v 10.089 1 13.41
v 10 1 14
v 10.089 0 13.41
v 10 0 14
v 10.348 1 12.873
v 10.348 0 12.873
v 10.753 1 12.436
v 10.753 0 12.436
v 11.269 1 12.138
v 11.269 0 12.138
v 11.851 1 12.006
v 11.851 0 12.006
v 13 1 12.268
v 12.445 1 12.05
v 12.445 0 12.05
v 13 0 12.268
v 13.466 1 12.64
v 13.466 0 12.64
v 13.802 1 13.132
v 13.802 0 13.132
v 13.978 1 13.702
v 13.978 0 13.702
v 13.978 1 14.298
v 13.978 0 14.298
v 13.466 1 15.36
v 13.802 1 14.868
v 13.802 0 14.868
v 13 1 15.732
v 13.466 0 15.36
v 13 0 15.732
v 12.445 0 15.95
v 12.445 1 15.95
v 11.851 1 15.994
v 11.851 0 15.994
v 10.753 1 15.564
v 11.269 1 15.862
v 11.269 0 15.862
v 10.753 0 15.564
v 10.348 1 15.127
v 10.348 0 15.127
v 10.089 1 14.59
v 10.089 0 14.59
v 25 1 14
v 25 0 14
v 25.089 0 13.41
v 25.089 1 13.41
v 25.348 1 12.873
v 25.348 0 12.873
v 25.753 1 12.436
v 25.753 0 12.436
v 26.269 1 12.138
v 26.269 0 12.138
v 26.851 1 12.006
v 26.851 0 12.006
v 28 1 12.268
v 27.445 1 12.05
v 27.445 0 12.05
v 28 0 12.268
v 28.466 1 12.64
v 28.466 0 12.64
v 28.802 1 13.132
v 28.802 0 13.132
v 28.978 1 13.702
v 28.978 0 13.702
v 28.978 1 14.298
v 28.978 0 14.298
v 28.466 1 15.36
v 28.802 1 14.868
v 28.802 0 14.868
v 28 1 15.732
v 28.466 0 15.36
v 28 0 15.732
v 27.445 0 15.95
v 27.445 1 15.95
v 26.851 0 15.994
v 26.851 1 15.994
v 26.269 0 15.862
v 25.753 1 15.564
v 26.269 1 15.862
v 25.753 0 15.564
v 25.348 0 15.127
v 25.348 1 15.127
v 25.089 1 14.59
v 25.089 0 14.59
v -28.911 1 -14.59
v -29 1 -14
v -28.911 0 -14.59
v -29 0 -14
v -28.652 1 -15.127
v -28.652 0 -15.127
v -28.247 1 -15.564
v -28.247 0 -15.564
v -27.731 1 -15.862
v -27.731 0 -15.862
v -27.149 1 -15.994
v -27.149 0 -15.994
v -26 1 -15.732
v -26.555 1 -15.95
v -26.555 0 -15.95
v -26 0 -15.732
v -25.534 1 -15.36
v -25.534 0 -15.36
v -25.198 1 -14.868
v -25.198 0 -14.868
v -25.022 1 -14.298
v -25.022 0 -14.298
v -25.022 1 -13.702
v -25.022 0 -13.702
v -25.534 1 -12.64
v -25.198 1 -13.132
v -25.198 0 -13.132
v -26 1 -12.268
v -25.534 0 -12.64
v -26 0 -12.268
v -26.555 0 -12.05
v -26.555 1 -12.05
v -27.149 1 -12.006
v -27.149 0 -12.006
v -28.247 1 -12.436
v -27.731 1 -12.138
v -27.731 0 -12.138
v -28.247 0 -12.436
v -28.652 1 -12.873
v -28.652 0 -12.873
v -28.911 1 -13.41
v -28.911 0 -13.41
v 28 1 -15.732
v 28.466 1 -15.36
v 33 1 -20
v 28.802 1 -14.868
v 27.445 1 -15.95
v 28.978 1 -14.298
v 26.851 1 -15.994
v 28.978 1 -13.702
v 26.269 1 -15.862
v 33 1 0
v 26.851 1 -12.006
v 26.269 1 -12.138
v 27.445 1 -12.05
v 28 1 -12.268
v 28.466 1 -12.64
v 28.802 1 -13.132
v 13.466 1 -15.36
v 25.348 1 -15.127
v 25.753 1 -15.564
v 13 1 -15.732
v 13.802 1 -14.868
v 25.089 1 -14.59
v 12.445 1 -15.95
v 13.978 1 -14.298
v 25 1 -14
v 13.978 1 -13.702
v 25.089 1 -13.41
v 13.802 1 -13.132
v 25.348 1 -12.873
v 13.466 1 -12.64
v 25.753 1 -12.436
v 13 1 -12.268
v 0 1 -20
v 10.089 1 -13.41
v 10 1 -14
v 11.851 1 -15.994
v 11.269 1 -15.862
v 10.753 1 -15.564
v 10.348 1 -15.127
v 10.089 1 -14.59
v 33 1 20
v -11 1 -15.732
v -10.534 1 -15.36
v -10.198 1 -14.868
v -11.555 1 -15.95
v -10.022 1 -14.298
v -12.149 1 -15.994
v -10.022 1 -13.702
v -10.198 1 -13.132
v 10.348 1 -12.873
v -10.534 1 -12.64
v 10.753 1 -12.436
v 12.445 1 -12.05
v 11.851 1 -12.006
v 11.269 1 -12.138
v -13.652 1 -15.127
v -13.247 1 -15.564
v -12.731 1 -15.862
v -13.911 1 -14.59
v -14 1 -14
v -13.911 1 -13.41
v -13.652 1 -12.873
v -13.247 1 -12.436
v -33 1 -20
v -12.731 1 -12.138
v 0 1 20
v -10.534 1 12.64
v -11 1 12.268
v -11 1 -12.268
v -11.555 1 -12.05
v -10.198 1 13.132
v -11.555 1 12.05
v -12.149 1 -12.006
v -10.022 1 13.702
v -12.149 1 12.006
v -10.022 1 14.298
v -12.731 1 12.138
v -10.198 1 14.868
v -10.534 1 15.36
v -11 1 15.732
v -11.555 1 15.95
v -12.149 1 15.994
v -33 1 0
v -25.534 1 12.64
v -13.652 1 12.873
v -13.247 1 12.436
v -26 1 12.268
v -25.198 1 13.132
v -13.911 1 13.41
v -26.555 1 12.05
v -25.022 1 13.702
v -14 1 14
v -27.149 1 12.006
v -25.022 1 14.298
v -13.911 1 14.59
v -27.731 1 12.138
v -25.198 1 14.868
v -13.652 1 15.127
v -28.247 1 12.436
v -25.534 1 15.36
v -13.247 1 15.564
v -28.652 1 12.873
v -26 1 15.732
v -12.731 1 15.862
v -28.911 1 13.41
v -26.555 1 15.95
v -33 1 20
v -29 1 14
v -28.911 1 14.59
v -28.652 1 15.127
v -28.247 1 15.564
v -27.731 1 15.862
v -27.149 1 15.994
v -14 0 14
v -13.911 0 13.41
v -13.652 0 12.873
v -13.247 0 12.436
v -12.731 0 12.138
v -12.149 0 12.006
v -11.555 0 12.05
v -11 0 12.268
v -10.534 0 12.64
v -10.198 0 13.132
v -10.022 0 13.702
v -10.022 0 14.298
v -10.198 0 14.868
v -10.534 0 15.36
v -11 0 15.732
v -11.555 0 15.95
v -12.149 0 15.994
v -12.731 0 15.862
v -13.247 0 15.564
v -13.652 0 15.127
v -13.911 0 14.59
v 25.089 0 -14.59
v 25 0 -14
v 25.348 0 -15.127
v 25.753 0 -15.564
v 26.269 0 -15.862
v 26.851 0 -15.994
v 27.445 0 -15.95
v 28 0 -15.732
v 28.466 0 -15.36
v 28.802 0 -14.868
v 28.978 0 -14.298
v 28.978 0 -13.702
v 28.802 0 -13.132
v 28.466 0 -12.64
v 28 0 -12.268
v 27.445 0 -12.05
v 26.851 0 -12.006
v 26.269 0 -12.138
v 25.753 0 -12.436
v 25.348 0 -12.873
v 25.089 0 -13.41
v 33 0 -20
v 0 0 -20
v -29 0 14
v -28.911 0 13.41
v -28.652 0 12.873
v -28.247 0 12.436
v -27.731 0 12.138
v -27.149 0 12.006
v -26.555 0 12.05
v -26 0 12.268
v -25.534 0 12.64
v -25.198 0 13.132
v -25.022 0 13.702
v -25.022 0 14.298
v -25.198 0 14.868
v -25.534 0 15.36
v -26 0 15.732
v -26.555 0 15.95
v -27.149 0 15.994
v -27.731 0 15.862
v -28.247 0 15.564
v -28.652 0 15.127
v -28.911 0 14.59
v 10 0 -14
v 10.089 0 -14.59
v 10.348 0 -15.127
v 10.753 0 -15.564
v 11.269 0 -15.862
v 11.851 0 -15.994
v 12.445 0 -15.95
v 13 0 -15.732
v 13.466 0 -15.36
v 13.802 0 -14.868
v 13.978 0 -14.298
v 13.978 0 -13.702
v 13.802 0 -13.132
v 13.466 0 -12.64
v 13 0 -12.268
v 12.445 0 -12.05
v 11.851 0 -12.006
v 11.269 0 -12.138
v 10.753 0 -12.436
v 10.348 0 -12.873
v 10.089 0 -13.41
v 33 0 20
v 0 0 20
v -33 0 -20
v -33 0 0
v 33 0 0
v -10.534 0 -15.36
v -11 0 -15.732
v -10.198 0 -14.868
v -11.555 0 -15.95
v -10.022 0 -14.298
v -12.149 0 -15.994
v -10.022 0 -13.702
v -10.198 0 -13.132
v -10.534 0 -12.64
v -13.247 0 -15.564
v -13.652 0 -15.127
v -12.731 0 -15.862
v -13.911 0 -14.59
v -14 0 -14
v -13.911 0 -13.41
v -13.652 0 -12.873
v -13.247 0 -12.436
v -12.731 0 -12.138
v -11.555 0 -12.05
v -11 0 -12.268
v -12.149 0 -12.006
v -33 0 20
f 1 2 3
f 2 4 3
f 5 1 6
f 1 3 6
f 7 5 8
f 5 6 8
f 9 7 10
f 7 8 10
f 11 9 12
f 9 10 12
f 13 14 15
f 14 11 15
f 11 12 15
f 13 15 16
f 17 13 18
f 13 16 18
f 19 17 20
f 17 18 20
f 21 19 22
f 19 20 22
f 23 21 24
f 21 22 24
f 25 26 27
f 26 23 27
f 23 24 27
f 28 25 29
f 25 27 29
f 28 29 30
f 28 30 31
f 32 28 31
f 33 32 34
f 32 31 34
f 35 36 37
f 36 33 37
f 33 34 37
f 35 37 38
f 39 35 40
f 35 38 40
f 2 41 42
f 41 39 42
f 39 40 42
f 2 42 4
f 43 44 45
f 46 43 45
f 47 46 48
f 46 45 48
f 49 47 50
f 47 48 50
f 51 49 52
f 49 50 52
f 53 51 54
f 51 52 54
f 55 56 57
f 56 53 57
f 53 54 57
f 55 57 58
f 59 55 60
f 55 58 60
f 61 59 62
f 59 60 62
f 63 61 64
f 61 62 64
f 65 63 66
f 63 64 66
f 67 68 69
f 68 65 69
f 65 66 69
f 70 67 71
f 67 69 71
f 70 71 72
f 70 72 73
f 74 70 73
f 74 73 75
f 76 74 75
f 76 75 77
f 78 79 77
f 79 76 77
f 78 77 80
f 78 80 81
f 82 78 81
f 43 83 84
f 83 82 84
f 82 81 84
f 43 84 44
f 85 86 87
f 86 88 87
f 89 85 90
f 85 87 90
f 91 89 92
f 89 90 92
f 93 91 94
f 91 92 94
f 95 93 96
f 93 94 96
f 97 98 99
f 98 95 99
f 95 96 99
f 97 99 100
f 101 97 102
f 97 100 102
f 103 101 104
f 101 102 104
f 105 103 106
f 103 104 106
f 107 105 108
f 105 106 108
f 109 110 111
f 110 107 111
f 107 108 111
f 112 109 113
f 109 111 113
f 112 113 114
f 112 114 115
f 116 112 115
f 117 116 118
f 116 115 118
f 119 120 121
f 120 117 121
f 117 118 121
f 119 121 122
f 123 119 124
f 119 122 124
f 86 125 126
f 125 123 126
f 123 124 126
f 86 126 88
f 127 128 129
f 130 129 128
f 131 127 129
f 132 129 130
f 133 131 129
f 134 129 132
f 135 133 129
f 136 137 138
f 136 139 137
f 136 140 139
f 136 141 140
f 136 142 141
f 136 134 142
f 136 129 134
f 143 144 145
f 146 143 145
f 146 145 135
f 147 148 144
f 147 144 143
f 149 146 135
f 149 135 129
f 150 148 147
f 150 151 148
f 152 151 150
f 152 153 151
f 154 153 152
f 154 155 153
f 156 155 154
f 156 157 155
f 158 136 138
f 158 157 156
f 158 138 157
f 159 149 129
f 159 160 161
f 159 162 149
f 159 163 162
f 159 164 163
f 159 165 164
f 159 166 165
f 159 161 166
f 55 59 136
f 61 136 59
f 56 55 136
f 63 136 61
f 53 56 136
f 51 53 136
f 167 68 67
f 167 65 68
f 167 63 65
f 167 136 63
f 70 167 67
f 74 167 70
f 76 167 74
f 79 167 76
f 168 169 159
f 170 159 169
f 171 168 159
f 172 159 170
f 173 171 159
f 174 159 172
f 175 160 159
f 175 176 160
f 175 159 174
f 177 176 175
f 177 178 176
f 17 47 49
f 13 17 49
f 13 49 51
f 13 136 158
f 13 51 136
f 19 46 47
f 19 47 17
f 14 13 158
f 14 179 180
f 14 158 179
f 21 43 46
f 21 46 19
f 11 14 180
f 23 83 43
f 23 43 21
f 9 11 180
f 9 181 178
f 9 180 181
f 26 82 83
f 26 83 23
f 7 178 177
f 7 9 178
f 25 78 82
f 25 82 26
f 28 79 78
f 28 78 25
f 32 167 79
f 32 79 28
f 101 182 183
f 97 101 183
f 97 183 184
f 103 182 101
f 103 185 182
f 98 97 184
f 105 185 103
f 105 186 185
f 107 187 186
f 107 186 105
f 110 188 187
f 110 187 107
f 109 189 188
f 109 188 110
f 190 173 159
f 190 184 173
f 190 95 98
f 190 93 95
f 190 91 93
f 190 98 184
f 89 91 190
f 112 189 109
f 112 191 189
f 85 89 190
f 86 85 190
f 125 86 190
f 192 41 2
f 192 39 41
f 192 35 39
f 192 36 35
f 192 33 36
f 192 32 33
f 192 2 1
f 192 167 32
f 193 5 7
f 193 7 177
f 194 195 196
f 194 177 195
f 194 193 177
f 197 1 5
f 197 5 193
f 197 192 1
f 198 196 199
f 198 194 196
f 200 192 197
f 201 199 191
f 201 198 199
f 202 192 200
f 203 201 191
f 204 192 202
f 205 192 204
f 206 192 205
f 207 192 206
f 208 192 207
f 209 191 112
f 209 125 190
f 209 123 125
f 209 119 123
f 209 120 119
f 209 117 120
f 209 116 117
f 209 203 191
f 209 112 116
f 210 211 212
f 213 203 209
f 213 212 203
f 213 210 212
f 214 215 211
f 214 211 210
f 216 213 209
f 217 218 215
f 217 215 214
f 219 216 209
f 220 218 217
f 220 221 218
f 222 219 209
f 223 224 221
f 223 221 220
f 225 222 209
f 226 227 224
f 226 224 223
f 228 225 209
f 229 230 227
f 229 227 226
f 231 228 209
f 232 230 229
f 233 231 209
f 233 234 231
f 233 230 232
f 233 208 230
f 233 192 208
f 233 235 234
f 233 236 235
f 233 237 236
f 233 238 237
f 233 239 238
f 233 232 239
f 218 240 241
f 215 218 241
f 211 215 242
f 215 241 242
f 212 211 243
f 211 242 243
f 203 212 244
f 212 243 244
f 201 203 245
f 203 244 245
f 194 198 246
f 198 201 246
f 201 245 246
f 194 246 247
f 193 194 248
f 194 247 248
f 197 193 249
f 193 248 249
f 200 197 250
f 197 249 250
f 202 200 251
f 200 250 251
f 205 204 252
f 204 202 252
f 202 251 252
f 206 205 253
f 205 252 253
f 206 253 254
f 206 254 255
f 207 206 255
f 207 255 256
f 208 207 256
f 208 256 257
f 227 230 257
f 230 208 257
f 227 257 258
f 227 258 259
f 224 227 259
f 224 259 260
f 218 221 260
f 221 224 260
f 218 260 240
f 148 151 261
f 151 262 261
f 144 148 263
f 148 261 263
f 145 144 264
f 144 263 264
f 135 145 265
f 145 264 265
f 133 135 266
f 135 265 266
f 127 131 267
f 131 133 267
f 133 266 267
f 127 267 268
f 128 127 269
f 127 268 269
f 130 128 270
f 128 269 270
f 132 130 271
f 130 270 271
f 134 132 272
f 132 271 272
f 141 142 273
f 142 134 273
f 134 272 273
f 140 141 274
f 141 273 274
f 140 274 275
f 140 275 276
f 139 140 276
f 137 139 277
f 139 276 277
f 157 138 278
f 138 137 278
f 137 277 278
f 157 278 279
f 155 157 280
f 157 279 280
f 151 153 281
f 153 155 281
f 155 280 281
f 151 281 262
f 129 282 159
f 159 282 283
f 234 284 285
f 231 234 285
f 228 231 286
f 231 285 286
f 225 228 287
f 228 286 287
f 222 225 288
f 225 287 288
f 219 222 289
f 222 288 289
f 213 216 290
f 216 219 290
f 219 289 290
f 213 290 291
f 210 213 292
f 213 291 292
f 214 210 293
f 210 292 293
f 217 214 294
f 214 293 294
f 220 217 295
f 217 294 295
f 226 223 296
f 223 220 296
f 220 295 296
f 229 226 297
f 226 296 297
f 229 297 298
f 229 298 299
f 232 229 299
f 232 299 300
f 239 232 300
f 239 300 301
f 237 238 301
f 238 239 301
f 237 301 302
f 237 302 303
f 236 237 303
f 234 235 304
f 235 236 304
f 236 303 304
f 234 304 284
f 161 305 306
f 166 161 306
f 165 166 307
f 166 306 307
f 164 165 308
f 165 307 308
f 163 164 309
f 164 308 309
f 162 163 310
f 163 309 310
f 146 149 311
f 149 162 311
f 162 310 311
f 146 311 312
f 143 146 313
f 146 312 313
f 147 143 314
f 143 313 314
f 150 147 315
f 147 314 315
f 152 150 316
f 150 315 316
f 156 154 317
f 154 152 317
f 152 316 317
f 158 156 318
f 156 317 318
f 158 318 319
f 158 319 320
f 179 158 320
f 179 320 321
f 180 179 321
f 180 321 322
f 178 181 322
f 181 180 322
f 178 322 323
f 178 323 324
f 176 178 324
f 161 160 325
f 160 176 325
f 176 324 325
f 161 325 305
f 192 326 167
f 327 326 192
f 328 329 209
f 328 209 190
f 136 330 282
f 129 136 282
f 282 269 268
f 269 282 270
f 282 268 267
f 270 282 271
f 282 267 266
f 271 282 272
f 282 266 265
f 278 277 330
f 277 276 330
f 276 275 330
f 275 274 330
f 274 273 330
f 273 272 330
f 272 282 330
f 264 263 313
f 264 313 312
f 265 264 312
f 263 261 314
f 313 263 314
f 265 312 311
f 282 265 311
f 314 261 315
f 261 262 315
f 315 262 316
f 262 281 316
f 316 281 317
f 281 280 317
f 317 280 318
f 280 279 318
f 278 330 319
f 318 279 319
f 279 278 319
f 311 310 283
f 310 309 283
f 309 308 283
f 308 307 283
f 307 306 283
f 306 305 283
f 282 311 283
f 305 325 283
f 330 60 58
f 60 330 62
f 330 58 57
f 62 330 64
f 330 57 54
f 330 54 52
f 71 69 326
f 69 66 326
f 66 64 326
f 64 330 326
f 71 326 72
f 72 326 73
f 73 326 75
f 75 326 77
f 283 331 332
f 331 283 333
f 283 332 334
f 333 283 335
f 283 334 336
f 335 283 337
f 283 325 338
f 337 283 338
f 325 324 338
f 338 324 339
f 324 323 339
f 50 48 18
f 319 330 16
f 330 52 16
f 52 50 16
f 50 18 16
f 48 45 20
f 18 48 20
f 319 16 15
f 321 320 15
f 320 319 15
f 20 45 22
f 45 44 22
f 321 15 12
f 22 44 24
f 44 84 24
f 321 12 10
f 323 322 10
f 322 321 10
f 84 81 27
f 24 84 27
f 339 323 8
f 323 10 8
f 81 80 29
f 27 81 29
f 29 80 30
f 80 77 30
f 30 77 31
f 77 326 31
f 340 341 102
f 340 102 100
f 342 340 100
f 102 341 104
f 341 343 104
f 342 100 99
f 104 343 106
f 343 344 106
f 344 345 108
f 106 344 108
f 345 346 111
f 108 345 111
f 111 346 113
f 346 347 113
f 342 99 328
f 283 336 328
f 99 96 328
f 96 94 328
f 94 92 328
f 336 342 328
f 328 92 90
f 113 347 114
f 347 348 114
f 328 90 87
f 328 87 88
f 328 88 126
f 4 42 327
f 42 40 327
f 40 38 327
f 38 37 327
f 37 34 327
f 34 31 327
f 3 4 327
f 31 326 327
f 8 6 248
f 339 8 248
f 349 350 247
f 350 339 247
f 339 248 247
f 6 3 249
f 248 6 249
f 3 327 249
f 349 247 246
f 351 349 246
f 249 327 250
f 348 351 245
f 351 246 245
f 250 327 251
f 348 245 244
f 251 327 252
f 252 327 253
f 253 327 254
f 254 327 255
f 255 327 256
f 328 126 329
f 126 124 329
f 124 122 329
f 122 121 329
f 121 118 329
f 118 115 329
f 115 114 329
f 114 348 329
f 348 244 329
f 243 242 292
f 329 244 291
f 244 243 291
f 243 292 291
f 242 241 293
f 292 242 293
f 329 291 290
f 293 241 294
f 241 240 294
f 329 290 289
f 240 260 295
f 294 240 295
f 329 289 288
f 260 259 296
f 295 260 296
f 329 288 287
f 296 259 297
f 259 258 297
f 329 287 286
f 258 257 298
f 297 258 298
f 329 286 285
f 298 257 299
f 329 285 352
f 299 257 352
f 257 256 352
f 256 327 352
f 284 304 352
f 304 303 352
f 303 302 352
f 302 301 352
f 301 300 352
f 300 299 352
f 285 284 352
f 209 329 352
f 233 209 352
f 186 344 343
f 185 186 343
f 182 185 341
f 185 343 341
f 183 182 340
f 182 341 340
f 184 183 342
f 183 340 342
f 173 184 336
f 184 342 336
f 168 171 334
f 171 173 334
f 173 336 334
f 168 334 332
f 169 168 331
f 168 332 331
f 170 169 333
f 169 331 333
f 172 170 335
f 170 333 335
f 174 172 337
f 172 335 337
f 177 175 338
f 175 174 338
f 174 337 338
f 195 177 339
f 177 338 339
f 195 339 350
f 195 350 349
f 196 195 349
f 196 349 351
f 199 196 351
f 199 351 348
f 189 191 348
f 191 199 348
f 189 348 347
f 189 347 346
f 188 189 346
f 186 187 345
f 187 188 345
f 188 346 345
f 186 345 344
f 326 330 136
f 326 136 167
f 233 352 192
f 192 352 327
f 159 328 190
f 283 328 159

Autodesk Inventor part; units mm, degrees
ref_plane "YZ Plane" through (0, 0, 0) normal (1, 0, 0) x (0, 1, 0)
ref_plane "XZ Plane" through (0, 0, 0) normal (0, 1, 0) x (-1, 0, 0)
ref_plane "XY Plane" through (0, 0, 0) normal (0, 0, 1) x (1, 0, 0)
sketch "Sketch1" plane through (0, 0, 0) normal (0, 1, 0) x (-1, 0, 0)
  line L0 (-33, 20) -> (0, 20)
  line L1 (0, 20) -> (0, 0) construction
  line L2 (0, 0) -> (-33, 0) construction
  line L3 (-33, 0) -> (-33, 20)
  line L4 (-37.8717, 14) -> (4.6091, 14) construction
  circle A0 centre (-12, 14) radius 2
  circle A1 centre (-27, 14) radius 2
  line L5 (33, 20) -> (0, 20)
  line L6 (33, 0) -> (33, 20)
  line L7 (37.8717, 14) -> (-4.6091, 14) construction
  circle A2 centre (12, 14) radius 2
  circle A3 centre (27, 14) radius 2
  line L8 (-33, -20) -> (0, -20)
  line L9 (0, -20) -> (0, 0) construction
  line L10 (-33, 0) -> (-33, -20)
  line L11 (-37.8717, -14) -> (4.6091, -14) construction
  circle A4 centre (-12, -14) radius 2
  circle A5 centre (-27, -14) radius 2
  line L12 (33, -20) -> (0, -20)
  line L13 (37.8717, -14) -> (-4.6091, -14) construction
  circle A6 centre (12, -14) radius 2
  circle A7 centre (27, -14) radius 2
  line L14 (33, 0) -> (33, -20)
  dimension "d0" = 33
  dimension "d1" = 20
  dimension "d2" = 6
  dimension "Bracket_Hole_Diameter" = 4
  dimension "d4" = 6
  dimension "d5" = 21
extrude "Plate1" add sketch "Sketch1" along normal blind 1
equation "\"BendRadius\" = Thickness"
equation "\"BendReliefWidth\" = Thickness"
equation "\"BendReliefDepth\" = 0.5 * Thickness"
equation "\"CornerReliefSize\" = 4 * Thickness"
equation "\"MinimumRemnant\" = 2 * Thickness"
equation "\"TransitionRadius\" = BendRadius"
equation "\"JacobiRadiusSize\" = BendRadius"
equation "\"GapSize\" = Thickness"
equation "\"d6\" = BendRadius"
equation "\"Bracket_Holes_LateralDistance\" = 28"
equation "\"Bracket_Holes_Distance\" = 15"
equation "\"Bracket_Holes_UnfoldedDistance\" = 24"
equation "\"Thickness\" = 1"
properties part number "BracketUnfolded" material "Steel, Galvanized"
